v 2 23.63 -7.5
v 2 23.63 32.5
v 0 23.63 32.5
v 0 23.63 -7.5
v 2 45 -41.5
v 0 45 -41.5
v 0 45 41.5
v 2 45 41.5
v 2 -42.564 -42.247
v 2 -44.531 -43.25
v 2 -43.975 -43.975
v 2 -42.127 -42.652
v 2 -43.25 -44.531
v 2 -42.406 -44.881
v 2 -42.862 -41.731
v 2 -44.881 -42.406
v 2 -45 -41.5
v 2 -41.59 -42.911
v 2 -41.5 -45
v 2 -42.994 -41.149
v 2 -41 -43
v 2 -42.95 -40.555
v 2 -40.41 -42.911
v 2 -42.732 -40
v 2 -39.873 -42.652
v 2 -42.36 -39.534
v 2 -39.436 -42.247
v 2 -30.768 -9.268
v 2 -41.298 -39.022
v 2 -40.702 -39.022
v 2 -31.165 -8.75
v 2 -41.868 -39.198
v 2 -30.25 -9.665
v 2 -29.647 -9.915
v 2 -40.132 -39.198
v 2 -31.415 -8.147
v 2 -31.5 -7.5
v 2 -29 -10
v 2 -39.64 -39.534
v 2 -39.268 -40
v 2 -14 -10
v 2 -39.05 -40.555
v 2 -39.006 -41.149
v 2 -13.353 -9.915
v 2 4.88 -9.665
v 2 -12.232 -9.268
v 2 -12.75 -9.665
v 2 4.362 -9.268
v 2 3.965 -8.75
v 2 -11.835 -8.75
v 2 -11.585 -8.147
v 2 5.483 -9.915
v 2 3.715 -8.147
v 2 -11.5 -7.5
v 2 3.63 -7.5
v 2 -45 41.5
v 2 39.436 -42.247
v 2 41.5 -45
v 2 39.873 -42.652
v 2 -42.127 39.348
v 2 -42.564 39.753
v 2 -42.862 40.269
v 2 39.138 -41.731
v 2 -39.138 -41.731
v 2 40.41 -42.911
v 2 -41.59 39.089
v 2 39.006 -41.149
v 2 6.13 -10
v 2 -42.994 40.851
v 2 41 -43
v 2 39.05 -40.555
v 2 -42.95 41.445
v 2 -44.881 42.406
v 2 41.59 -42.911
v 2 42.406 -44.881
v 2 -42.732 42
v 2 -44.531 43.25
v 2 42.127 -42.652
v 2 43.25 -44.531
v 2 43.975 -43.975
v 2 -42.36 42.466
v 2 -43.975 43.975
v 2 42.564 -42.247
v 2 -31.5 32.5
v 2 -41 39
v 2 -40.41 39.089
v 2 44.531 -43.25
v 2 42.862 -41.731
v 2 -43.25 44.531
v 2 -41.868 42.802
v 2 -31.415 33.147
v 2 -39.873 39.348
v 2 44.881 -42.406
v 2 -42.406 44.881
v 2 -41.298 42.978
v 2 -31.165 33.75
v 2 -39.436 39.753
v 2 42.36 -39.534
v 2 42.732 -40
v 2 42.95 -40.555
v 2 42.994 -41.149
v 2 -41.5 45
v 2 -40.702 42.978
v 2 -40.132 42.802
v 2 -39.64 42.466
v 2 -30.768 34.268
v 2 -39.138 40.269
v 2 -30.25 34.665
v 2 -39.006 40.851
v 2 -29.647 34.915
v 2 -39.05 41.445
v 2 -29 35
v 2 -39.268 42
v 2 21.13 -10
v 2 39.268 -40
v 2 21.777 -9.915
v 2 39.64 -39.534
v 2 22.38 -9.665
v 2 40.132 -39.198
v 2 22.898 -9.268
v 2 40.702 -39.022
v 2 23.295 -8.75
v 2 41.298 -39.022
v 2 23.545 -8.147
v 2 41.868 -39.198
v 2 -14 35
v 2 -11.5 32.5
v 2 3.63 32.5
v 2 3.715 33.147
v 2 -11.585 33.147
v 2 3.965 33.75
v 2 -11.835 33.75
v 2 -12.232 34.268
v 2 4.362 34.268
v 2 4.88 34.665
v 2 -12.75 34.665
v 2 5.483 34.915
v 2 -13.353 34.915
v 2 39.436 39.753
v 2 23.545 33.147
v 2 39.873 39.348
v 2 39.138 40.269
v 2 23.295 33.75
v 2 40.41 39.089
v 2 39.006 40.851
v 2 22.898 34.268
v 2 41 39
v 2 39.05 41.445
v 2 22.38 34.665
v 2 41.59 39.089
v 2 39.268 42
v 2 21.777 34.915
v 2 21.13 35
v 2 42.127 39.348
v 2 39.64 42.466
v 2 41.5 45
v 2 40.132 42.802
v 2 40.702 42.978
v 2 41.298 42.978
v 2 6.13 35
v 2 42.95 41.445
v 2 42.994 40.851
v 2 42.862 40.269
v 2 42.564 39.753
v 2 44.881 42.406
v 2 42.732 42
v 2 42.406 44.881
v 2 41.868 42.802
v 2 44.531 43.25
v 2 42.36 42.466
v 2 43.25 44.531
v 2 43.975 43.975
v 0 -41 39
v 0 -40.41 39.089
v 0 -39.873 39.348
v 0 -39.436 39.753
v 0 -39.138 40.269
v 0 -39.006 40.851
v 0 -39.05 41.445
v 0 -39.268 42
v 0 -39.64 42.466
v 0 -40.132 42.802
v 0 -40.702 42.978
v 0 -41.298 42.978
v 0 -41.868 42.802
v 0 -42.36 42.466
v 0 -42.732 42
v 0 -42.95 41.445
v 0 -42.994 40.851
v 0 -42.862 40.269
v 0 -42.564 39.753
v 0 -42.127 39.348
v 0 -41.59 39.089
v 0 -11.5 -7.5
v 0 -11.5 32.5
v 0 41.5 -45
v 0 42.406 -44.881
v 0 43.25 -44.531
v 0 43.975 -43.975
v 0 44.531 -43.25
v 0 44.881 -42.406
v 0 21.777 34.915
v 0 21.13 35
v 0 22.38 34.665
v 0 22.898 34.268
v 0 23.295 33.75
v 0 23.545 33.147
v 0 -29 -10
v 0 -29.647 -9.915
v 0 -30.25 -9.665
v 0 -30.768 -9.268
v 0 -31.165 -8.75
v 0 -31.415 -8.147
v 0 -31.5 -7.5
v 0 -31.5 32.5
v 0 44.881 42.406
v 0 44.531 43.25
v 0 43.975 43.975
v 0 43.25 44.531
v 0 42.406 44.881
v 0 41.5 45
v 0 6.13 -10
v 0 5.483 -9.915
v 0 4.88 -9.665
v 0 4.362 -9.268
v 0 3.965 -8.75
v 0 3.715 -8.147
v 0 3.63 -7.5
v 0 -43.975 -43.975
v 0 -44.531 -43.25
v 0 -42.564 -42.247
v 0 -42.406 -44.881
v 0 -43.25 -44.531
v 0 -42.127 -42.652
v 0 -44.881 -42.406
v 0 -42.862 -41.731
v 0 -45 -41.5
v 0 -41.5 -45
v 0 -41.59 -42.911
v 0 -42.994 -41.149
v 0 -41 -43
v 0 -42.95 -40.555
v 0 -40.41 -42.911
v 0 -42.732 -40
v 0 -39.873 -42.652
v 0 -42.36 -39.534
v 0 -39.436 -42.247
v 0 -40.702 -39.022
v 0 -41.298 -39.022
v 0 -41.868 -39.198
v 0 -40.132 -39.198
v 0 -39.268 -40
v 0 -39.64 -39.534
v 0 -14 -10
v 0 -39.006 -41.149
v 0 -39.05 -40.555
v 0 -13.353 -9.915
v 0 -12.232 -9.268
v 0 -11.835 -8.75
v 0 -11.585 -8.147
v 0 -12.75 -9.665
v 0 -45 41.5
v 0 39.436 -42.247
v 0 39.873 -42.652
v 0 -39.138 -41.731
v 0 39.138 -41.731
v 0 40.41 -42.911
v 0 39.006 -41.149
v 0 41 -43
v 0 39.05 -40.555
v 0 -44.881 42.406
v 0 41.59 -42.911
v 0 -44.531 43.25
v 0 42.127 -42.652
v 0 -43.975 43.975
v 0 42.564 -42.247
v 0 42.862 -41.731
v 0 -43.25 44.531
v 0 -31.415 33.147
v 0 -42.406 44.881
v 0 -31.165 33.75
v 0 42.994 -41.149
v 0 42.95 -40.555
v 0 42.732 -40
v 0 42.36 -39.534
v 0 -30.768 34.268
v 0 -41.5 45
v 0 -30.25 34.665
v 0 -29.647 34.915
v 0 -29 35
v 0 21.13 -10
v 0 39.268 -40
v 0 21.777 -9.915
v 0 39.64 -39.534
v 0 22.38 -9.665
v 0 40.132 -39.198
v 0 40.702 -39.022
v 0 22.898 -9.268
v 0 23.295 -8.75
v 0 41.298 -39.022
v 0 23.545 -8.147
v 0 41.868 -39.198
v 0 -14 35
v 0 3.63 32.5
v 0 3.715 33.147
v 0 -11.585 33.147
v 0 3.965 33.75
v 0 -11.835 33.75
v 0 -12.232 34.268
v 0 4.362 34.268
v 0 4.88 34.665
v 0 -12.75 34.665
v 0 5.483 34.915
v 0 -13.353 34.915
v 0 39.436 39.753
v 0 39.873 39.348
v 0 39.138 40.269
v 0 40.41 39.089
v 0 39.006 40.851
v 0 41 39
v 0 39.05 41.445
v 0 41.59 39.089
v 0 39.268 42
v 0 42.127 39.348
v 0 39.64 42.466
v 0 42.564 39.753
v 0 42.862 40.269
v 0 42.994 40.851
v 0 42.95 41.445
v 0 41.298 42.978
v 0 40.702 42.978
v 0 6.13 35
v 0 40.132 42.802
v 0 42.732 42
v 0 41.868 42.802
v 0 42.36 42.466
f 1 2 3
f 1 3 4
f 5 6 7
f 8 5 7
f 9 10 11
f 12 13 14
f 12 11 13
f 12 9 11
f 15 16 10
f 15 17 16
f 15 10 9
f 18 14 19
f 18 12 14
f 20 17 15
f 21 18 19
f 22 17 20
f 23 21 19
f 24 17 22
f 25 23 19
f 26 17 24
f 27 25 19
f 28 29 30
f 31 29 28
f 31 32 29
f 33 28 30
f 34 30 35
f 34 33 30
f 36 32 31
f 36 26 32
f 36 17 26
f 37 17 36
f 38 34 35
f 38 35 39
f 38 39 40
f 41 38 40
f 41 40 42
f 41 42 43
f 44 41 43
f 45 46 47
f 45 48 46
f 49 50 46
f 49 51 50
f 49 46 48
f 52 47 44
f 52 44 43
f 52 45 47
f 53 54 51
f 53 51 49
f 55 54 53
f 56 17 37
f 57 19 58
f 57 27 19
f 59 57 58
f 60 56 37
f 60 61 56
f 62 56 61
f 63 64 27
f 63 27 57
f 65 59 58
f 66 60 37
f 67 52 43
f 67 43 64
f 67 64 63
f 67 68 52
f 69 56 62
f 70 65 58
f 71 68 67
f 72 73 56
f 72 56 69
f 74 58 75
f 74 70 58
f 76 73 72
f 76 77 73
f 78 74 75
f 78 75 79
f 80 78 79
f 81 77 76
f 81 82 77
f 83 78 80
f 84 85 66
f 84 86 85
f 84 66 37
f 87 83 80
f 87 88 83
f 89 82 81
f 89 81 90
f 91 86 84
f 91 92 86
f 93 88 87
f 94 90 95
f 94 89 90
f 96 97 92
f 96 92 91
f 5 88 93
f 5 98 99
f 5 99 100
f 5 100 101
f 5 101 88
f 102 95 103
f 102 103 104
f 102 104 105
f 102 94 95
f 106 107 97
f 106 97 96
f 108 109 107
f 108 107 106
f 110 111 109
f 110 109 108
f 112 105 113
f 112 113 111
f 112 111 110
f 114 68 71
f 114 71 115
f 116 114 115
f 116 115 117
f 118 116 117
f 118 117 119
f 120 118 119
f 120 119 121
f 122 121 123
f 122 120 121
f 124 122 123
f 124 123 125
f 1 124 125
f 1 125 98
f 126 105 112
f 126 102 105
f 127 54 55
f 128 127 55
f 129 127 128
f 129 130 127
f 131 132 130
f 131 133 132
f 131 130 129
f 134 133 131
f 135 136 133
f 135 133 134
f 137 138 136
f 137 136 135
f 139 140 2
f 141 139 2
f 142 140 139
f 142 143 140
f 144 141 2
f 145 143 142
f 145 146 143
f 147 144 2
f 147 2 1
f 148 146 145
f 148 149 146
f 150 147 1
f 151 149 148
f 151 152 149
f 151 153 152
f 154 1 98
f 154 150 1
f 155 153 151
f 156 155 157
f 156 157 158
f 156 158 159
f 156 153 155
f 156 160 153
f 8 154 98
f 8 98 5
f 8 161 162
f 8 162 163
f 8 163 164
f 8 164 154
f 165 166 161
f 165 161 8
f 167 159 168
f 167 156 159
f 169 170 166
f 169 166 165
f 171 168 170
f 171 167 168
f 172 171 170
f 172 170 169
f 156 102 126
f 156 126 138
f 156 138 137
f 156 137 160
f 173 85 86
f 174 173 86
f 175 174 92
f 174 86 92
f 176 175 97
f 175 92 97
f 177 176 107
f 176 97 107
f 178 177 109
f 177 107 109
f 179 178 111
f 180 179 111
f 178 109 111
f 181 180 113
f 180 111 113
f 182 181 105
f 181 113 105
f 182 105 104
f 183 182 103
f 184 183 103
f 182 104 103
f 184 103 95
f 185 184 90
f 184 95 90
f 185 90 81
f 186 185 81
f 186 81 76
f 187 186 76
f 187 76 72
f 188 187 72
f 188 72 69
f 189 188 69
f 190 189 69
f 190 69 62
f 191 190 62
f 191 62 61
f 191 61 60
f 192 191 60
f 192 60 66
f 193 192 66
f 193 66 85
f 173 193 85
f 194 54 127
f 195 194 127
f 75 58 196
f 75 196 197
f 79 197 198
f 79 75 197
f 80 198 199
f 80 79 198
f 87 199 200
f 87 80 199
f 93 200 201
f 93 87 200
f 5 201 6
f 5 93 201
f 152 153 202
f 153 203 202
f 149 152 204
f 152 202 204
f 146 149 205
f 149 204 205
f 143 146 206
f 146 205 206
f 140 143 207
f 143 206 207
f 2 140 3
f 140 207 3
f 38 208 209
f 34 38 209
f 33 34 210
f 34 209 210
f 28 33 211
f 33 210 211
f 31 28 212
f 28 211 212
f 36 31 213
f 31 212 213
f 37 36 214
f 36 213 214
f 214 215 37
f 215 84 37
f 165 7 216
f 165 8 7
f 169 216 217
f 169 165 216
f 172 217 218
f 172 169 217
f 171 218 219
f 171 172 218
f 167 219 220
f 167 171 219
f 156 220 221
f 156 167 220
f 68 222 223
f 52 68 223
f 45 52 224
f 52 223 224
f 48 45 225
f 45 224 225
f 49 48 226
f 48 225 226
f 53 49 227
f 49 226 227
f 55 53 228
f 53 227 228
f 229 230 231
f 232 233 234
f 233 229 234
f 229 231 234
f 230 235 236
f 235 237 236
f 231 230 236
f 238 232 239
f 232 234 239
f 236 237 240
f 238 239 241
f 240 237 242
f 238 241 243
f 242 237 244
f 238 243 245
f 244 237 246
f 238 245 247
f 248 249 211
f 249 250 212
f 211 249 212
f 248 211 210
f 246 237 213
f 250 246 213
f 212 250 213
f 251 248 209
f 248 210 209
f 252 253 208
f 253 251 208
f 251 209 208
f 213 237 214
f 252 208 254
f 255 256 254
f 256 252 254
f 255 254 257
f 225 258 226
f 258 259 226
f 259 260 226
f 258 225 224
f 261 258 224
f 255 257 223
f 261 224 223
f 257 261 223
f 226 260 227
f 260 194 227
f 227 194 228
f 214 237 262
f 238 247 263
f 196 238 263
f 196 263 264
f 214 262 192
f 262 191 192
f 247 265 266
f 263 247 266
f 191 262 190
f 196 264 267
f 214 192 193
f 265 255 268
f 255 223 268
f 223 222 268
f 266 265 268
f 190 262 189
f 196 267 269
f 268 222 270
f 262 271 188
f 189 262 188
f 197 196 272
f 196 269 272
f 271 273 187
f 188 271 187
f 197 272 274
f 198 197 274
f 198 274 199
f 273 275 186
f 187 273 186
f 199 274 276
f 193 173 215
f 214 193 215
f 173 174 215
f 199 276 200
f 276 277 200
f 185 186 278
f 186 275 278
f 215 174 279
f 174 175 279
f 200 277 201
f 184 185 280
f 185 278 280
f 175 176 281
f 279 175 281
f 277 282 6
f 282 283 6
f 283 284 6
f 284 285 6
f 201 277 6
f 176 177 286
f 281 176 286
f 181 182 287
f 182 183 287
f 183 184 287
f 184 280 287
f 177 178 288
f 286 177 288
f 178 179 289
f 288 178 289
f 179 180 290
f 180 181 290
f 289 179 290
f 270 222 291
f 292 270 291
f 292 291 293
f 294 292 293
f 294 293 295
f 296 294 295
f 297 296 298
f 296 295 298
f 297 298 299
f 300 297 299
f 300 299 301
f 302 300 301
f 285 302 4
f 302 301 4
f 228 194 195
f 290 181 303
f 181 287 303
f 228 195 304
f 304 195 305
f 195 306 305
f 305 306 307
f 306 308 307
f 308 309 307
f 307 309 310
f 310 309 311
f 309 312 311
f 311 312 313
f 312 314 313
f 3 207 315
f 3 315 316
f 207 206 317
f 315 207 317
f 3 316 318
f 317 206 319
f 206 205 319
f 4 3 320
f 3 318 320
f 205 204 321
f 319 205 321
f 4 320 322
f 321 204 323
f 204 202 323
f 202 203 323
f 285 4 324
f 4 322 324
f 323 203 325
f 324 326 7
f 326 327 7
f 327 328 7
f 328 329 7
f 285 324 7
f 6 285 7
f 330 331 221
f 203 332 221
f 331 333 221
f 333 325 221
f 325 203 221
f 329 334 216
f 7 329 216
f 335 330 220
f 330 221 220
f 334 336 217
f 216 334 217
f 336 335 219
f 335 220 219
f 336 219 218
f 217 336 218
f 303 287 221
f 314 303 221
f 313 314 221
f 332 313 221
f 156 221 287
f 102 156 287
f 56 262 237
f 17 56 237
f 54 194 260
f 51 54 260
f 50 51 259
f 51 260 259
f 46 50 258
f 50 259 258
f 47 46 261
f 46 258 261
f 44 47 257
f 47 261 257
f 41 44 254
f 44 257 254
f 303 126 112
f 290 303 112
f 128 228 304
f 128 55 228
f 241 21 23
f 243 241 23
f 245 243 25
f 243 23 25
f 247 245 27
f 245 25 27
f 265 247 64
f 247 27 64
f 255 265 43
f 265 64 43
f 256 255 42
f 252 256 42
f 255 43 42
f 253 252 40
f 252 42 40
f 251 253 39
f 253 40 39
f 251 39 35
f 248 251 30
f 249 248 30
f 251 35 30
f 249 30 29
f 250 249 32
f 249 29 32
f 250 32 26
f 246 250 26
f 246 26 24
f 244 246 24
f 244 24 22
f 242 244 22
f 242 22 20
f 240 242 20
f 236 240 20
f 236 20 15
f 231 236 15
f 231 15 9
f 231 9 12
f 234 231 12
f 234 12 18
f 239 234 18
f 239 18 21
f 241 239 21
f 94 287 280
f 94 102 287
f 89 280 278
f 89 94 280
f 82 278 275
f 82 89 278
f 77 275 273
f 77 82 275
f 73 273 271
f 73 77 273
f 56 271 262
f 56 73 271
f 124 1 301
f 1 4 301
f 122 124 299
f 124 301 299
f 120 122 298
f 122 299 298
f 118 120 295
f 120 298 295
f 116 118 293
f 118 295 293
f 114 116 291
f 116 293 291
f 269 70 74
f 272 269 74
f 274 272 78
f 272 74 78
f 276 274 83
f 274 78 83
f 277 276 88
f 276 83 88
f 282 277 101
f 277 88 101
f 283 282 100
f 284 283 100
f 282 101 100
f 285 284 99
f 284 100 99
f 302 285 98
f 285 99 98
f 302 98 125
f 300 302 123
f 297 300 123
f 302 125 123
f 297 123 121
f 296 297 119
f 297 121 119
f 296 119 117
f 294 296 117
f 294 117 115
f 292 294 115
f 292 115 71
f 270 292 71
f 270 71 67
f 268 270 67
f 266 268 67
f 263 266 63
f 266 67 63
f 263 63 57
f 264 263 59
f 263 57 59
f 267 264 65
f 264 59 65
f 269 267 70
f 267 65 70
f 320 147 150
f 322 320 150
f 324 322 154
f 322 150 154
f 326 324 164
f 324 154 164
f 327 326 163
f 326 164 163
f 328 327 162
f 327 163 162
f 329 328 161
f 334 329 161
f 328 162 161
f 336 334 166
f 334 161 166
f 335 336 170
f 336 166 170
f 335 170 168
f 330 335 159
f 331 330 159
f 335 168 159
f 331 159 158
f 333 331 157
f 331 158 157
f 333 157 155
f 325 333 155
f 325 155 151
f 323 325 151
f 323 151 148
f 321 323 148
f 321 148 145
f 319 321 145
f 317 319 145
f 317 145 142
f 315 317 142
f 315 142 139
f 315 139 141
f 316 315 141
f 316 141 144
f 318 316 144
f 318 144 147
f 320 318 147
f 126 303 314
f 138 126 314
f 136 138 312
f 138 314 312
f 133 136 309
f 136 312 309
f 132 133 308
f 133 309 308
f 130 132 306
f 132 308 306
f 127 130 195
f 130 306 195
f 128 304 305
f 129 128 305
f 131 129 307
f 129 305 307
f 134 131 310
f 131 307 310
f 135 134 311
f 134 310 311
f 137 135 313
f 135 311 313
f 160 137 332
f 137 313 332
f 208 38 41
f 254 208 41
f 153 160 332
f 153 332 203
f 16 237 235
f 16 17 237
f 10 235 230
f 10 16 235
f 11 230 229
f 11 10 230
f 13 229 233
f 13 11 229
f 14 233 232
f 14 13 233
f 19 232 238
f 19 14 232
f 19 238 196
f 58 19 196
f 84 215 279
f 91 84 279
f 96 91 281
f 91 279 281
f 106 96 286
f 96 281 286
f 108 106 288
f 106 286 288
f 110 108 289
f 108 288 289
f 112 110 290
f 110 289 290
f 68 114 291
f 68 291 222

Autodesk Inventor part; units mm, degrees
ref_plane "YZ Plane" through (0, 0, 0) normal (1, 0, 0) x (0, 1, 0)
ref_plane "XZ Plane" through (0, 0, 0) normal (0, 1, 0) x (-1, 0, 0)
ref_plane "XY Plane" through (0, 0, 0) normal (0, 0, 1) x (1, 0, 0)
sketch "Sketch1" plane through (0, 0, 0) normal (1, 0, 0) x (0, 1, 0)
  line L0 (45, 45) -> (-45, 45)
  line L1 (-45, 45) -> (-45, -45)
  line L2 (-45, -45) -> (45, -45)
  line L3 (45, -45) -> (45, 45)
  line L4 (45, 45) -> (-45, -45) construction
  line L5 (-45, 45) -> (45, -45) construction
  point P0 (0, 0)
  dimension "d0" = 90
  dimension "d1" = 90
extrude "Extrusion1" add sketch "Sketch1" along normal blind 2
sketch "Sketch2" plane through (2, 0, 0) normal (1, 0, 0) x (0, 0, -1)
  line L0 (45, 45) -> (-45, 45) projected
  line L1 (-45, 45) -> (-41, 45)
  line L2 (-41, 45) -> (-41, 41)
  circle A0 centre (-41, 41) radius 2
  line L3 (45, -45) -> (45, 45) projected
  line L4 (45, 45) -> (41, 45)
  line L5 (41, 45) -> (41, 41)
  circle A1 centre (41, 41) radius 2
  line L6 (-45, 45) -> (-45, -45) projected
  line L7 (-45, -45) -> (-41, -45)
  line L8 (-45, -45) -> (45, -45) projected
  line L9 (-41, -45) -> (-41, -41)
  circle A2 centre (-41, -41) radius 2
  line L10 (45, -45) -> (41, -45)
  line L11 (41, -45) -> (41, -41)
  circle A3 centre (41, -41) radius 2
  point P0 (0, 0)
  dimension "d4" = 4
  dimension "d5" = 4
  dimension "d6" = 4
  dimension "d7" = 4
  dimension "d8" = 4
  dimension "d9" = 4
  dimension "d10" = 4
  dimension "d11" = 4
  dimension "d12" = 4
  dimension "d13" = 4
  dimension "d14" = 4
  dimension "d15" = 4
extrude "Extrusion2" cut sketch "Sketch2" against normal up to surface (2 mm away) contours A1 | A0 | A2 | A3
fillet "Fillet1" radius 3.5 4 edges at (1, 45, -45) (1, -45, -45) (1, -45, 45) (1, 45, 45)
sketch "Sketch3" plane through (2, 0, 0) normal (1, 0, 0) x (0, 0, -1)
  line L0 (-41.5, -45) -> (41.5, -45) projected
  line L1 (0, -45) -> (0, -41.5)
  line L2 (0, -41.5) -> (0, -31.5)
  line L3 (0, -31.5) -> (0, -11.5)
  line L4 (0, -45) -> (0, -6.37)
  line L5 (0, -6.37) -> (0, 3.63)
  line L6 (0, 3.63) -> (0, 23.63)
  line L7 (45, -41.5) -> (45, 41.5) projected
  line L8 (45, 0) -> (10, 0)
  line L9 (10, 0) -> (10, 3.63)
  line L10 (10, 3.63) -> (-35, 3.63)
  line L11 (-35, 3.63) -> (-35, 23.63)
  line L12 (-35, 23.63) -> (10, 23.63)
  line L13 (10, 23.63) -> (10, 3.63)
  line L14 (10, 0) -> (10, -11.5)
  line L15 (10, -11.5) -> (-35, -11.5)
  line L16 (-35, -11.5) -> (-35, -31.5)
  line L17 (-35, -31.5) -> (10, -31.5)
  line L18 (10, -31.5) -> (10, -11.5)
  point P0 (0, 0)
  dimension "d19" = 3.5
  dimension "d20" = 10
  dimension "d21" = 20
  dimension "d22" = 38.63
  dimension "d23" = 10
  dimension "d24" = 20
  dimension "d25" = 35
  dimension "d26" = 45
  dimension "d27" = 20
  dimension "d28" = 45
  dimension "d29" = 20
extrude "Extrusion3" cut sketch "Sketch3" against normal up to surface (2 mm away) contours L17 L16 L15 L3 | L3 L15 L18 L17 | L10 L11 L12 L6 | L6 L12 L13 L10
fillet "Fillet2" radius 2.5 8 edges at (1, 23.63, -10) (1, -11.5, -10) (1, 23.63, 35) (1, -11.5, 35) (1, 3.63, -10) (1, -31.5, -10) (1, 3.63, 35) (1, -31.5, 35)
properties part number "RightCover" material "ABS Plastic"
